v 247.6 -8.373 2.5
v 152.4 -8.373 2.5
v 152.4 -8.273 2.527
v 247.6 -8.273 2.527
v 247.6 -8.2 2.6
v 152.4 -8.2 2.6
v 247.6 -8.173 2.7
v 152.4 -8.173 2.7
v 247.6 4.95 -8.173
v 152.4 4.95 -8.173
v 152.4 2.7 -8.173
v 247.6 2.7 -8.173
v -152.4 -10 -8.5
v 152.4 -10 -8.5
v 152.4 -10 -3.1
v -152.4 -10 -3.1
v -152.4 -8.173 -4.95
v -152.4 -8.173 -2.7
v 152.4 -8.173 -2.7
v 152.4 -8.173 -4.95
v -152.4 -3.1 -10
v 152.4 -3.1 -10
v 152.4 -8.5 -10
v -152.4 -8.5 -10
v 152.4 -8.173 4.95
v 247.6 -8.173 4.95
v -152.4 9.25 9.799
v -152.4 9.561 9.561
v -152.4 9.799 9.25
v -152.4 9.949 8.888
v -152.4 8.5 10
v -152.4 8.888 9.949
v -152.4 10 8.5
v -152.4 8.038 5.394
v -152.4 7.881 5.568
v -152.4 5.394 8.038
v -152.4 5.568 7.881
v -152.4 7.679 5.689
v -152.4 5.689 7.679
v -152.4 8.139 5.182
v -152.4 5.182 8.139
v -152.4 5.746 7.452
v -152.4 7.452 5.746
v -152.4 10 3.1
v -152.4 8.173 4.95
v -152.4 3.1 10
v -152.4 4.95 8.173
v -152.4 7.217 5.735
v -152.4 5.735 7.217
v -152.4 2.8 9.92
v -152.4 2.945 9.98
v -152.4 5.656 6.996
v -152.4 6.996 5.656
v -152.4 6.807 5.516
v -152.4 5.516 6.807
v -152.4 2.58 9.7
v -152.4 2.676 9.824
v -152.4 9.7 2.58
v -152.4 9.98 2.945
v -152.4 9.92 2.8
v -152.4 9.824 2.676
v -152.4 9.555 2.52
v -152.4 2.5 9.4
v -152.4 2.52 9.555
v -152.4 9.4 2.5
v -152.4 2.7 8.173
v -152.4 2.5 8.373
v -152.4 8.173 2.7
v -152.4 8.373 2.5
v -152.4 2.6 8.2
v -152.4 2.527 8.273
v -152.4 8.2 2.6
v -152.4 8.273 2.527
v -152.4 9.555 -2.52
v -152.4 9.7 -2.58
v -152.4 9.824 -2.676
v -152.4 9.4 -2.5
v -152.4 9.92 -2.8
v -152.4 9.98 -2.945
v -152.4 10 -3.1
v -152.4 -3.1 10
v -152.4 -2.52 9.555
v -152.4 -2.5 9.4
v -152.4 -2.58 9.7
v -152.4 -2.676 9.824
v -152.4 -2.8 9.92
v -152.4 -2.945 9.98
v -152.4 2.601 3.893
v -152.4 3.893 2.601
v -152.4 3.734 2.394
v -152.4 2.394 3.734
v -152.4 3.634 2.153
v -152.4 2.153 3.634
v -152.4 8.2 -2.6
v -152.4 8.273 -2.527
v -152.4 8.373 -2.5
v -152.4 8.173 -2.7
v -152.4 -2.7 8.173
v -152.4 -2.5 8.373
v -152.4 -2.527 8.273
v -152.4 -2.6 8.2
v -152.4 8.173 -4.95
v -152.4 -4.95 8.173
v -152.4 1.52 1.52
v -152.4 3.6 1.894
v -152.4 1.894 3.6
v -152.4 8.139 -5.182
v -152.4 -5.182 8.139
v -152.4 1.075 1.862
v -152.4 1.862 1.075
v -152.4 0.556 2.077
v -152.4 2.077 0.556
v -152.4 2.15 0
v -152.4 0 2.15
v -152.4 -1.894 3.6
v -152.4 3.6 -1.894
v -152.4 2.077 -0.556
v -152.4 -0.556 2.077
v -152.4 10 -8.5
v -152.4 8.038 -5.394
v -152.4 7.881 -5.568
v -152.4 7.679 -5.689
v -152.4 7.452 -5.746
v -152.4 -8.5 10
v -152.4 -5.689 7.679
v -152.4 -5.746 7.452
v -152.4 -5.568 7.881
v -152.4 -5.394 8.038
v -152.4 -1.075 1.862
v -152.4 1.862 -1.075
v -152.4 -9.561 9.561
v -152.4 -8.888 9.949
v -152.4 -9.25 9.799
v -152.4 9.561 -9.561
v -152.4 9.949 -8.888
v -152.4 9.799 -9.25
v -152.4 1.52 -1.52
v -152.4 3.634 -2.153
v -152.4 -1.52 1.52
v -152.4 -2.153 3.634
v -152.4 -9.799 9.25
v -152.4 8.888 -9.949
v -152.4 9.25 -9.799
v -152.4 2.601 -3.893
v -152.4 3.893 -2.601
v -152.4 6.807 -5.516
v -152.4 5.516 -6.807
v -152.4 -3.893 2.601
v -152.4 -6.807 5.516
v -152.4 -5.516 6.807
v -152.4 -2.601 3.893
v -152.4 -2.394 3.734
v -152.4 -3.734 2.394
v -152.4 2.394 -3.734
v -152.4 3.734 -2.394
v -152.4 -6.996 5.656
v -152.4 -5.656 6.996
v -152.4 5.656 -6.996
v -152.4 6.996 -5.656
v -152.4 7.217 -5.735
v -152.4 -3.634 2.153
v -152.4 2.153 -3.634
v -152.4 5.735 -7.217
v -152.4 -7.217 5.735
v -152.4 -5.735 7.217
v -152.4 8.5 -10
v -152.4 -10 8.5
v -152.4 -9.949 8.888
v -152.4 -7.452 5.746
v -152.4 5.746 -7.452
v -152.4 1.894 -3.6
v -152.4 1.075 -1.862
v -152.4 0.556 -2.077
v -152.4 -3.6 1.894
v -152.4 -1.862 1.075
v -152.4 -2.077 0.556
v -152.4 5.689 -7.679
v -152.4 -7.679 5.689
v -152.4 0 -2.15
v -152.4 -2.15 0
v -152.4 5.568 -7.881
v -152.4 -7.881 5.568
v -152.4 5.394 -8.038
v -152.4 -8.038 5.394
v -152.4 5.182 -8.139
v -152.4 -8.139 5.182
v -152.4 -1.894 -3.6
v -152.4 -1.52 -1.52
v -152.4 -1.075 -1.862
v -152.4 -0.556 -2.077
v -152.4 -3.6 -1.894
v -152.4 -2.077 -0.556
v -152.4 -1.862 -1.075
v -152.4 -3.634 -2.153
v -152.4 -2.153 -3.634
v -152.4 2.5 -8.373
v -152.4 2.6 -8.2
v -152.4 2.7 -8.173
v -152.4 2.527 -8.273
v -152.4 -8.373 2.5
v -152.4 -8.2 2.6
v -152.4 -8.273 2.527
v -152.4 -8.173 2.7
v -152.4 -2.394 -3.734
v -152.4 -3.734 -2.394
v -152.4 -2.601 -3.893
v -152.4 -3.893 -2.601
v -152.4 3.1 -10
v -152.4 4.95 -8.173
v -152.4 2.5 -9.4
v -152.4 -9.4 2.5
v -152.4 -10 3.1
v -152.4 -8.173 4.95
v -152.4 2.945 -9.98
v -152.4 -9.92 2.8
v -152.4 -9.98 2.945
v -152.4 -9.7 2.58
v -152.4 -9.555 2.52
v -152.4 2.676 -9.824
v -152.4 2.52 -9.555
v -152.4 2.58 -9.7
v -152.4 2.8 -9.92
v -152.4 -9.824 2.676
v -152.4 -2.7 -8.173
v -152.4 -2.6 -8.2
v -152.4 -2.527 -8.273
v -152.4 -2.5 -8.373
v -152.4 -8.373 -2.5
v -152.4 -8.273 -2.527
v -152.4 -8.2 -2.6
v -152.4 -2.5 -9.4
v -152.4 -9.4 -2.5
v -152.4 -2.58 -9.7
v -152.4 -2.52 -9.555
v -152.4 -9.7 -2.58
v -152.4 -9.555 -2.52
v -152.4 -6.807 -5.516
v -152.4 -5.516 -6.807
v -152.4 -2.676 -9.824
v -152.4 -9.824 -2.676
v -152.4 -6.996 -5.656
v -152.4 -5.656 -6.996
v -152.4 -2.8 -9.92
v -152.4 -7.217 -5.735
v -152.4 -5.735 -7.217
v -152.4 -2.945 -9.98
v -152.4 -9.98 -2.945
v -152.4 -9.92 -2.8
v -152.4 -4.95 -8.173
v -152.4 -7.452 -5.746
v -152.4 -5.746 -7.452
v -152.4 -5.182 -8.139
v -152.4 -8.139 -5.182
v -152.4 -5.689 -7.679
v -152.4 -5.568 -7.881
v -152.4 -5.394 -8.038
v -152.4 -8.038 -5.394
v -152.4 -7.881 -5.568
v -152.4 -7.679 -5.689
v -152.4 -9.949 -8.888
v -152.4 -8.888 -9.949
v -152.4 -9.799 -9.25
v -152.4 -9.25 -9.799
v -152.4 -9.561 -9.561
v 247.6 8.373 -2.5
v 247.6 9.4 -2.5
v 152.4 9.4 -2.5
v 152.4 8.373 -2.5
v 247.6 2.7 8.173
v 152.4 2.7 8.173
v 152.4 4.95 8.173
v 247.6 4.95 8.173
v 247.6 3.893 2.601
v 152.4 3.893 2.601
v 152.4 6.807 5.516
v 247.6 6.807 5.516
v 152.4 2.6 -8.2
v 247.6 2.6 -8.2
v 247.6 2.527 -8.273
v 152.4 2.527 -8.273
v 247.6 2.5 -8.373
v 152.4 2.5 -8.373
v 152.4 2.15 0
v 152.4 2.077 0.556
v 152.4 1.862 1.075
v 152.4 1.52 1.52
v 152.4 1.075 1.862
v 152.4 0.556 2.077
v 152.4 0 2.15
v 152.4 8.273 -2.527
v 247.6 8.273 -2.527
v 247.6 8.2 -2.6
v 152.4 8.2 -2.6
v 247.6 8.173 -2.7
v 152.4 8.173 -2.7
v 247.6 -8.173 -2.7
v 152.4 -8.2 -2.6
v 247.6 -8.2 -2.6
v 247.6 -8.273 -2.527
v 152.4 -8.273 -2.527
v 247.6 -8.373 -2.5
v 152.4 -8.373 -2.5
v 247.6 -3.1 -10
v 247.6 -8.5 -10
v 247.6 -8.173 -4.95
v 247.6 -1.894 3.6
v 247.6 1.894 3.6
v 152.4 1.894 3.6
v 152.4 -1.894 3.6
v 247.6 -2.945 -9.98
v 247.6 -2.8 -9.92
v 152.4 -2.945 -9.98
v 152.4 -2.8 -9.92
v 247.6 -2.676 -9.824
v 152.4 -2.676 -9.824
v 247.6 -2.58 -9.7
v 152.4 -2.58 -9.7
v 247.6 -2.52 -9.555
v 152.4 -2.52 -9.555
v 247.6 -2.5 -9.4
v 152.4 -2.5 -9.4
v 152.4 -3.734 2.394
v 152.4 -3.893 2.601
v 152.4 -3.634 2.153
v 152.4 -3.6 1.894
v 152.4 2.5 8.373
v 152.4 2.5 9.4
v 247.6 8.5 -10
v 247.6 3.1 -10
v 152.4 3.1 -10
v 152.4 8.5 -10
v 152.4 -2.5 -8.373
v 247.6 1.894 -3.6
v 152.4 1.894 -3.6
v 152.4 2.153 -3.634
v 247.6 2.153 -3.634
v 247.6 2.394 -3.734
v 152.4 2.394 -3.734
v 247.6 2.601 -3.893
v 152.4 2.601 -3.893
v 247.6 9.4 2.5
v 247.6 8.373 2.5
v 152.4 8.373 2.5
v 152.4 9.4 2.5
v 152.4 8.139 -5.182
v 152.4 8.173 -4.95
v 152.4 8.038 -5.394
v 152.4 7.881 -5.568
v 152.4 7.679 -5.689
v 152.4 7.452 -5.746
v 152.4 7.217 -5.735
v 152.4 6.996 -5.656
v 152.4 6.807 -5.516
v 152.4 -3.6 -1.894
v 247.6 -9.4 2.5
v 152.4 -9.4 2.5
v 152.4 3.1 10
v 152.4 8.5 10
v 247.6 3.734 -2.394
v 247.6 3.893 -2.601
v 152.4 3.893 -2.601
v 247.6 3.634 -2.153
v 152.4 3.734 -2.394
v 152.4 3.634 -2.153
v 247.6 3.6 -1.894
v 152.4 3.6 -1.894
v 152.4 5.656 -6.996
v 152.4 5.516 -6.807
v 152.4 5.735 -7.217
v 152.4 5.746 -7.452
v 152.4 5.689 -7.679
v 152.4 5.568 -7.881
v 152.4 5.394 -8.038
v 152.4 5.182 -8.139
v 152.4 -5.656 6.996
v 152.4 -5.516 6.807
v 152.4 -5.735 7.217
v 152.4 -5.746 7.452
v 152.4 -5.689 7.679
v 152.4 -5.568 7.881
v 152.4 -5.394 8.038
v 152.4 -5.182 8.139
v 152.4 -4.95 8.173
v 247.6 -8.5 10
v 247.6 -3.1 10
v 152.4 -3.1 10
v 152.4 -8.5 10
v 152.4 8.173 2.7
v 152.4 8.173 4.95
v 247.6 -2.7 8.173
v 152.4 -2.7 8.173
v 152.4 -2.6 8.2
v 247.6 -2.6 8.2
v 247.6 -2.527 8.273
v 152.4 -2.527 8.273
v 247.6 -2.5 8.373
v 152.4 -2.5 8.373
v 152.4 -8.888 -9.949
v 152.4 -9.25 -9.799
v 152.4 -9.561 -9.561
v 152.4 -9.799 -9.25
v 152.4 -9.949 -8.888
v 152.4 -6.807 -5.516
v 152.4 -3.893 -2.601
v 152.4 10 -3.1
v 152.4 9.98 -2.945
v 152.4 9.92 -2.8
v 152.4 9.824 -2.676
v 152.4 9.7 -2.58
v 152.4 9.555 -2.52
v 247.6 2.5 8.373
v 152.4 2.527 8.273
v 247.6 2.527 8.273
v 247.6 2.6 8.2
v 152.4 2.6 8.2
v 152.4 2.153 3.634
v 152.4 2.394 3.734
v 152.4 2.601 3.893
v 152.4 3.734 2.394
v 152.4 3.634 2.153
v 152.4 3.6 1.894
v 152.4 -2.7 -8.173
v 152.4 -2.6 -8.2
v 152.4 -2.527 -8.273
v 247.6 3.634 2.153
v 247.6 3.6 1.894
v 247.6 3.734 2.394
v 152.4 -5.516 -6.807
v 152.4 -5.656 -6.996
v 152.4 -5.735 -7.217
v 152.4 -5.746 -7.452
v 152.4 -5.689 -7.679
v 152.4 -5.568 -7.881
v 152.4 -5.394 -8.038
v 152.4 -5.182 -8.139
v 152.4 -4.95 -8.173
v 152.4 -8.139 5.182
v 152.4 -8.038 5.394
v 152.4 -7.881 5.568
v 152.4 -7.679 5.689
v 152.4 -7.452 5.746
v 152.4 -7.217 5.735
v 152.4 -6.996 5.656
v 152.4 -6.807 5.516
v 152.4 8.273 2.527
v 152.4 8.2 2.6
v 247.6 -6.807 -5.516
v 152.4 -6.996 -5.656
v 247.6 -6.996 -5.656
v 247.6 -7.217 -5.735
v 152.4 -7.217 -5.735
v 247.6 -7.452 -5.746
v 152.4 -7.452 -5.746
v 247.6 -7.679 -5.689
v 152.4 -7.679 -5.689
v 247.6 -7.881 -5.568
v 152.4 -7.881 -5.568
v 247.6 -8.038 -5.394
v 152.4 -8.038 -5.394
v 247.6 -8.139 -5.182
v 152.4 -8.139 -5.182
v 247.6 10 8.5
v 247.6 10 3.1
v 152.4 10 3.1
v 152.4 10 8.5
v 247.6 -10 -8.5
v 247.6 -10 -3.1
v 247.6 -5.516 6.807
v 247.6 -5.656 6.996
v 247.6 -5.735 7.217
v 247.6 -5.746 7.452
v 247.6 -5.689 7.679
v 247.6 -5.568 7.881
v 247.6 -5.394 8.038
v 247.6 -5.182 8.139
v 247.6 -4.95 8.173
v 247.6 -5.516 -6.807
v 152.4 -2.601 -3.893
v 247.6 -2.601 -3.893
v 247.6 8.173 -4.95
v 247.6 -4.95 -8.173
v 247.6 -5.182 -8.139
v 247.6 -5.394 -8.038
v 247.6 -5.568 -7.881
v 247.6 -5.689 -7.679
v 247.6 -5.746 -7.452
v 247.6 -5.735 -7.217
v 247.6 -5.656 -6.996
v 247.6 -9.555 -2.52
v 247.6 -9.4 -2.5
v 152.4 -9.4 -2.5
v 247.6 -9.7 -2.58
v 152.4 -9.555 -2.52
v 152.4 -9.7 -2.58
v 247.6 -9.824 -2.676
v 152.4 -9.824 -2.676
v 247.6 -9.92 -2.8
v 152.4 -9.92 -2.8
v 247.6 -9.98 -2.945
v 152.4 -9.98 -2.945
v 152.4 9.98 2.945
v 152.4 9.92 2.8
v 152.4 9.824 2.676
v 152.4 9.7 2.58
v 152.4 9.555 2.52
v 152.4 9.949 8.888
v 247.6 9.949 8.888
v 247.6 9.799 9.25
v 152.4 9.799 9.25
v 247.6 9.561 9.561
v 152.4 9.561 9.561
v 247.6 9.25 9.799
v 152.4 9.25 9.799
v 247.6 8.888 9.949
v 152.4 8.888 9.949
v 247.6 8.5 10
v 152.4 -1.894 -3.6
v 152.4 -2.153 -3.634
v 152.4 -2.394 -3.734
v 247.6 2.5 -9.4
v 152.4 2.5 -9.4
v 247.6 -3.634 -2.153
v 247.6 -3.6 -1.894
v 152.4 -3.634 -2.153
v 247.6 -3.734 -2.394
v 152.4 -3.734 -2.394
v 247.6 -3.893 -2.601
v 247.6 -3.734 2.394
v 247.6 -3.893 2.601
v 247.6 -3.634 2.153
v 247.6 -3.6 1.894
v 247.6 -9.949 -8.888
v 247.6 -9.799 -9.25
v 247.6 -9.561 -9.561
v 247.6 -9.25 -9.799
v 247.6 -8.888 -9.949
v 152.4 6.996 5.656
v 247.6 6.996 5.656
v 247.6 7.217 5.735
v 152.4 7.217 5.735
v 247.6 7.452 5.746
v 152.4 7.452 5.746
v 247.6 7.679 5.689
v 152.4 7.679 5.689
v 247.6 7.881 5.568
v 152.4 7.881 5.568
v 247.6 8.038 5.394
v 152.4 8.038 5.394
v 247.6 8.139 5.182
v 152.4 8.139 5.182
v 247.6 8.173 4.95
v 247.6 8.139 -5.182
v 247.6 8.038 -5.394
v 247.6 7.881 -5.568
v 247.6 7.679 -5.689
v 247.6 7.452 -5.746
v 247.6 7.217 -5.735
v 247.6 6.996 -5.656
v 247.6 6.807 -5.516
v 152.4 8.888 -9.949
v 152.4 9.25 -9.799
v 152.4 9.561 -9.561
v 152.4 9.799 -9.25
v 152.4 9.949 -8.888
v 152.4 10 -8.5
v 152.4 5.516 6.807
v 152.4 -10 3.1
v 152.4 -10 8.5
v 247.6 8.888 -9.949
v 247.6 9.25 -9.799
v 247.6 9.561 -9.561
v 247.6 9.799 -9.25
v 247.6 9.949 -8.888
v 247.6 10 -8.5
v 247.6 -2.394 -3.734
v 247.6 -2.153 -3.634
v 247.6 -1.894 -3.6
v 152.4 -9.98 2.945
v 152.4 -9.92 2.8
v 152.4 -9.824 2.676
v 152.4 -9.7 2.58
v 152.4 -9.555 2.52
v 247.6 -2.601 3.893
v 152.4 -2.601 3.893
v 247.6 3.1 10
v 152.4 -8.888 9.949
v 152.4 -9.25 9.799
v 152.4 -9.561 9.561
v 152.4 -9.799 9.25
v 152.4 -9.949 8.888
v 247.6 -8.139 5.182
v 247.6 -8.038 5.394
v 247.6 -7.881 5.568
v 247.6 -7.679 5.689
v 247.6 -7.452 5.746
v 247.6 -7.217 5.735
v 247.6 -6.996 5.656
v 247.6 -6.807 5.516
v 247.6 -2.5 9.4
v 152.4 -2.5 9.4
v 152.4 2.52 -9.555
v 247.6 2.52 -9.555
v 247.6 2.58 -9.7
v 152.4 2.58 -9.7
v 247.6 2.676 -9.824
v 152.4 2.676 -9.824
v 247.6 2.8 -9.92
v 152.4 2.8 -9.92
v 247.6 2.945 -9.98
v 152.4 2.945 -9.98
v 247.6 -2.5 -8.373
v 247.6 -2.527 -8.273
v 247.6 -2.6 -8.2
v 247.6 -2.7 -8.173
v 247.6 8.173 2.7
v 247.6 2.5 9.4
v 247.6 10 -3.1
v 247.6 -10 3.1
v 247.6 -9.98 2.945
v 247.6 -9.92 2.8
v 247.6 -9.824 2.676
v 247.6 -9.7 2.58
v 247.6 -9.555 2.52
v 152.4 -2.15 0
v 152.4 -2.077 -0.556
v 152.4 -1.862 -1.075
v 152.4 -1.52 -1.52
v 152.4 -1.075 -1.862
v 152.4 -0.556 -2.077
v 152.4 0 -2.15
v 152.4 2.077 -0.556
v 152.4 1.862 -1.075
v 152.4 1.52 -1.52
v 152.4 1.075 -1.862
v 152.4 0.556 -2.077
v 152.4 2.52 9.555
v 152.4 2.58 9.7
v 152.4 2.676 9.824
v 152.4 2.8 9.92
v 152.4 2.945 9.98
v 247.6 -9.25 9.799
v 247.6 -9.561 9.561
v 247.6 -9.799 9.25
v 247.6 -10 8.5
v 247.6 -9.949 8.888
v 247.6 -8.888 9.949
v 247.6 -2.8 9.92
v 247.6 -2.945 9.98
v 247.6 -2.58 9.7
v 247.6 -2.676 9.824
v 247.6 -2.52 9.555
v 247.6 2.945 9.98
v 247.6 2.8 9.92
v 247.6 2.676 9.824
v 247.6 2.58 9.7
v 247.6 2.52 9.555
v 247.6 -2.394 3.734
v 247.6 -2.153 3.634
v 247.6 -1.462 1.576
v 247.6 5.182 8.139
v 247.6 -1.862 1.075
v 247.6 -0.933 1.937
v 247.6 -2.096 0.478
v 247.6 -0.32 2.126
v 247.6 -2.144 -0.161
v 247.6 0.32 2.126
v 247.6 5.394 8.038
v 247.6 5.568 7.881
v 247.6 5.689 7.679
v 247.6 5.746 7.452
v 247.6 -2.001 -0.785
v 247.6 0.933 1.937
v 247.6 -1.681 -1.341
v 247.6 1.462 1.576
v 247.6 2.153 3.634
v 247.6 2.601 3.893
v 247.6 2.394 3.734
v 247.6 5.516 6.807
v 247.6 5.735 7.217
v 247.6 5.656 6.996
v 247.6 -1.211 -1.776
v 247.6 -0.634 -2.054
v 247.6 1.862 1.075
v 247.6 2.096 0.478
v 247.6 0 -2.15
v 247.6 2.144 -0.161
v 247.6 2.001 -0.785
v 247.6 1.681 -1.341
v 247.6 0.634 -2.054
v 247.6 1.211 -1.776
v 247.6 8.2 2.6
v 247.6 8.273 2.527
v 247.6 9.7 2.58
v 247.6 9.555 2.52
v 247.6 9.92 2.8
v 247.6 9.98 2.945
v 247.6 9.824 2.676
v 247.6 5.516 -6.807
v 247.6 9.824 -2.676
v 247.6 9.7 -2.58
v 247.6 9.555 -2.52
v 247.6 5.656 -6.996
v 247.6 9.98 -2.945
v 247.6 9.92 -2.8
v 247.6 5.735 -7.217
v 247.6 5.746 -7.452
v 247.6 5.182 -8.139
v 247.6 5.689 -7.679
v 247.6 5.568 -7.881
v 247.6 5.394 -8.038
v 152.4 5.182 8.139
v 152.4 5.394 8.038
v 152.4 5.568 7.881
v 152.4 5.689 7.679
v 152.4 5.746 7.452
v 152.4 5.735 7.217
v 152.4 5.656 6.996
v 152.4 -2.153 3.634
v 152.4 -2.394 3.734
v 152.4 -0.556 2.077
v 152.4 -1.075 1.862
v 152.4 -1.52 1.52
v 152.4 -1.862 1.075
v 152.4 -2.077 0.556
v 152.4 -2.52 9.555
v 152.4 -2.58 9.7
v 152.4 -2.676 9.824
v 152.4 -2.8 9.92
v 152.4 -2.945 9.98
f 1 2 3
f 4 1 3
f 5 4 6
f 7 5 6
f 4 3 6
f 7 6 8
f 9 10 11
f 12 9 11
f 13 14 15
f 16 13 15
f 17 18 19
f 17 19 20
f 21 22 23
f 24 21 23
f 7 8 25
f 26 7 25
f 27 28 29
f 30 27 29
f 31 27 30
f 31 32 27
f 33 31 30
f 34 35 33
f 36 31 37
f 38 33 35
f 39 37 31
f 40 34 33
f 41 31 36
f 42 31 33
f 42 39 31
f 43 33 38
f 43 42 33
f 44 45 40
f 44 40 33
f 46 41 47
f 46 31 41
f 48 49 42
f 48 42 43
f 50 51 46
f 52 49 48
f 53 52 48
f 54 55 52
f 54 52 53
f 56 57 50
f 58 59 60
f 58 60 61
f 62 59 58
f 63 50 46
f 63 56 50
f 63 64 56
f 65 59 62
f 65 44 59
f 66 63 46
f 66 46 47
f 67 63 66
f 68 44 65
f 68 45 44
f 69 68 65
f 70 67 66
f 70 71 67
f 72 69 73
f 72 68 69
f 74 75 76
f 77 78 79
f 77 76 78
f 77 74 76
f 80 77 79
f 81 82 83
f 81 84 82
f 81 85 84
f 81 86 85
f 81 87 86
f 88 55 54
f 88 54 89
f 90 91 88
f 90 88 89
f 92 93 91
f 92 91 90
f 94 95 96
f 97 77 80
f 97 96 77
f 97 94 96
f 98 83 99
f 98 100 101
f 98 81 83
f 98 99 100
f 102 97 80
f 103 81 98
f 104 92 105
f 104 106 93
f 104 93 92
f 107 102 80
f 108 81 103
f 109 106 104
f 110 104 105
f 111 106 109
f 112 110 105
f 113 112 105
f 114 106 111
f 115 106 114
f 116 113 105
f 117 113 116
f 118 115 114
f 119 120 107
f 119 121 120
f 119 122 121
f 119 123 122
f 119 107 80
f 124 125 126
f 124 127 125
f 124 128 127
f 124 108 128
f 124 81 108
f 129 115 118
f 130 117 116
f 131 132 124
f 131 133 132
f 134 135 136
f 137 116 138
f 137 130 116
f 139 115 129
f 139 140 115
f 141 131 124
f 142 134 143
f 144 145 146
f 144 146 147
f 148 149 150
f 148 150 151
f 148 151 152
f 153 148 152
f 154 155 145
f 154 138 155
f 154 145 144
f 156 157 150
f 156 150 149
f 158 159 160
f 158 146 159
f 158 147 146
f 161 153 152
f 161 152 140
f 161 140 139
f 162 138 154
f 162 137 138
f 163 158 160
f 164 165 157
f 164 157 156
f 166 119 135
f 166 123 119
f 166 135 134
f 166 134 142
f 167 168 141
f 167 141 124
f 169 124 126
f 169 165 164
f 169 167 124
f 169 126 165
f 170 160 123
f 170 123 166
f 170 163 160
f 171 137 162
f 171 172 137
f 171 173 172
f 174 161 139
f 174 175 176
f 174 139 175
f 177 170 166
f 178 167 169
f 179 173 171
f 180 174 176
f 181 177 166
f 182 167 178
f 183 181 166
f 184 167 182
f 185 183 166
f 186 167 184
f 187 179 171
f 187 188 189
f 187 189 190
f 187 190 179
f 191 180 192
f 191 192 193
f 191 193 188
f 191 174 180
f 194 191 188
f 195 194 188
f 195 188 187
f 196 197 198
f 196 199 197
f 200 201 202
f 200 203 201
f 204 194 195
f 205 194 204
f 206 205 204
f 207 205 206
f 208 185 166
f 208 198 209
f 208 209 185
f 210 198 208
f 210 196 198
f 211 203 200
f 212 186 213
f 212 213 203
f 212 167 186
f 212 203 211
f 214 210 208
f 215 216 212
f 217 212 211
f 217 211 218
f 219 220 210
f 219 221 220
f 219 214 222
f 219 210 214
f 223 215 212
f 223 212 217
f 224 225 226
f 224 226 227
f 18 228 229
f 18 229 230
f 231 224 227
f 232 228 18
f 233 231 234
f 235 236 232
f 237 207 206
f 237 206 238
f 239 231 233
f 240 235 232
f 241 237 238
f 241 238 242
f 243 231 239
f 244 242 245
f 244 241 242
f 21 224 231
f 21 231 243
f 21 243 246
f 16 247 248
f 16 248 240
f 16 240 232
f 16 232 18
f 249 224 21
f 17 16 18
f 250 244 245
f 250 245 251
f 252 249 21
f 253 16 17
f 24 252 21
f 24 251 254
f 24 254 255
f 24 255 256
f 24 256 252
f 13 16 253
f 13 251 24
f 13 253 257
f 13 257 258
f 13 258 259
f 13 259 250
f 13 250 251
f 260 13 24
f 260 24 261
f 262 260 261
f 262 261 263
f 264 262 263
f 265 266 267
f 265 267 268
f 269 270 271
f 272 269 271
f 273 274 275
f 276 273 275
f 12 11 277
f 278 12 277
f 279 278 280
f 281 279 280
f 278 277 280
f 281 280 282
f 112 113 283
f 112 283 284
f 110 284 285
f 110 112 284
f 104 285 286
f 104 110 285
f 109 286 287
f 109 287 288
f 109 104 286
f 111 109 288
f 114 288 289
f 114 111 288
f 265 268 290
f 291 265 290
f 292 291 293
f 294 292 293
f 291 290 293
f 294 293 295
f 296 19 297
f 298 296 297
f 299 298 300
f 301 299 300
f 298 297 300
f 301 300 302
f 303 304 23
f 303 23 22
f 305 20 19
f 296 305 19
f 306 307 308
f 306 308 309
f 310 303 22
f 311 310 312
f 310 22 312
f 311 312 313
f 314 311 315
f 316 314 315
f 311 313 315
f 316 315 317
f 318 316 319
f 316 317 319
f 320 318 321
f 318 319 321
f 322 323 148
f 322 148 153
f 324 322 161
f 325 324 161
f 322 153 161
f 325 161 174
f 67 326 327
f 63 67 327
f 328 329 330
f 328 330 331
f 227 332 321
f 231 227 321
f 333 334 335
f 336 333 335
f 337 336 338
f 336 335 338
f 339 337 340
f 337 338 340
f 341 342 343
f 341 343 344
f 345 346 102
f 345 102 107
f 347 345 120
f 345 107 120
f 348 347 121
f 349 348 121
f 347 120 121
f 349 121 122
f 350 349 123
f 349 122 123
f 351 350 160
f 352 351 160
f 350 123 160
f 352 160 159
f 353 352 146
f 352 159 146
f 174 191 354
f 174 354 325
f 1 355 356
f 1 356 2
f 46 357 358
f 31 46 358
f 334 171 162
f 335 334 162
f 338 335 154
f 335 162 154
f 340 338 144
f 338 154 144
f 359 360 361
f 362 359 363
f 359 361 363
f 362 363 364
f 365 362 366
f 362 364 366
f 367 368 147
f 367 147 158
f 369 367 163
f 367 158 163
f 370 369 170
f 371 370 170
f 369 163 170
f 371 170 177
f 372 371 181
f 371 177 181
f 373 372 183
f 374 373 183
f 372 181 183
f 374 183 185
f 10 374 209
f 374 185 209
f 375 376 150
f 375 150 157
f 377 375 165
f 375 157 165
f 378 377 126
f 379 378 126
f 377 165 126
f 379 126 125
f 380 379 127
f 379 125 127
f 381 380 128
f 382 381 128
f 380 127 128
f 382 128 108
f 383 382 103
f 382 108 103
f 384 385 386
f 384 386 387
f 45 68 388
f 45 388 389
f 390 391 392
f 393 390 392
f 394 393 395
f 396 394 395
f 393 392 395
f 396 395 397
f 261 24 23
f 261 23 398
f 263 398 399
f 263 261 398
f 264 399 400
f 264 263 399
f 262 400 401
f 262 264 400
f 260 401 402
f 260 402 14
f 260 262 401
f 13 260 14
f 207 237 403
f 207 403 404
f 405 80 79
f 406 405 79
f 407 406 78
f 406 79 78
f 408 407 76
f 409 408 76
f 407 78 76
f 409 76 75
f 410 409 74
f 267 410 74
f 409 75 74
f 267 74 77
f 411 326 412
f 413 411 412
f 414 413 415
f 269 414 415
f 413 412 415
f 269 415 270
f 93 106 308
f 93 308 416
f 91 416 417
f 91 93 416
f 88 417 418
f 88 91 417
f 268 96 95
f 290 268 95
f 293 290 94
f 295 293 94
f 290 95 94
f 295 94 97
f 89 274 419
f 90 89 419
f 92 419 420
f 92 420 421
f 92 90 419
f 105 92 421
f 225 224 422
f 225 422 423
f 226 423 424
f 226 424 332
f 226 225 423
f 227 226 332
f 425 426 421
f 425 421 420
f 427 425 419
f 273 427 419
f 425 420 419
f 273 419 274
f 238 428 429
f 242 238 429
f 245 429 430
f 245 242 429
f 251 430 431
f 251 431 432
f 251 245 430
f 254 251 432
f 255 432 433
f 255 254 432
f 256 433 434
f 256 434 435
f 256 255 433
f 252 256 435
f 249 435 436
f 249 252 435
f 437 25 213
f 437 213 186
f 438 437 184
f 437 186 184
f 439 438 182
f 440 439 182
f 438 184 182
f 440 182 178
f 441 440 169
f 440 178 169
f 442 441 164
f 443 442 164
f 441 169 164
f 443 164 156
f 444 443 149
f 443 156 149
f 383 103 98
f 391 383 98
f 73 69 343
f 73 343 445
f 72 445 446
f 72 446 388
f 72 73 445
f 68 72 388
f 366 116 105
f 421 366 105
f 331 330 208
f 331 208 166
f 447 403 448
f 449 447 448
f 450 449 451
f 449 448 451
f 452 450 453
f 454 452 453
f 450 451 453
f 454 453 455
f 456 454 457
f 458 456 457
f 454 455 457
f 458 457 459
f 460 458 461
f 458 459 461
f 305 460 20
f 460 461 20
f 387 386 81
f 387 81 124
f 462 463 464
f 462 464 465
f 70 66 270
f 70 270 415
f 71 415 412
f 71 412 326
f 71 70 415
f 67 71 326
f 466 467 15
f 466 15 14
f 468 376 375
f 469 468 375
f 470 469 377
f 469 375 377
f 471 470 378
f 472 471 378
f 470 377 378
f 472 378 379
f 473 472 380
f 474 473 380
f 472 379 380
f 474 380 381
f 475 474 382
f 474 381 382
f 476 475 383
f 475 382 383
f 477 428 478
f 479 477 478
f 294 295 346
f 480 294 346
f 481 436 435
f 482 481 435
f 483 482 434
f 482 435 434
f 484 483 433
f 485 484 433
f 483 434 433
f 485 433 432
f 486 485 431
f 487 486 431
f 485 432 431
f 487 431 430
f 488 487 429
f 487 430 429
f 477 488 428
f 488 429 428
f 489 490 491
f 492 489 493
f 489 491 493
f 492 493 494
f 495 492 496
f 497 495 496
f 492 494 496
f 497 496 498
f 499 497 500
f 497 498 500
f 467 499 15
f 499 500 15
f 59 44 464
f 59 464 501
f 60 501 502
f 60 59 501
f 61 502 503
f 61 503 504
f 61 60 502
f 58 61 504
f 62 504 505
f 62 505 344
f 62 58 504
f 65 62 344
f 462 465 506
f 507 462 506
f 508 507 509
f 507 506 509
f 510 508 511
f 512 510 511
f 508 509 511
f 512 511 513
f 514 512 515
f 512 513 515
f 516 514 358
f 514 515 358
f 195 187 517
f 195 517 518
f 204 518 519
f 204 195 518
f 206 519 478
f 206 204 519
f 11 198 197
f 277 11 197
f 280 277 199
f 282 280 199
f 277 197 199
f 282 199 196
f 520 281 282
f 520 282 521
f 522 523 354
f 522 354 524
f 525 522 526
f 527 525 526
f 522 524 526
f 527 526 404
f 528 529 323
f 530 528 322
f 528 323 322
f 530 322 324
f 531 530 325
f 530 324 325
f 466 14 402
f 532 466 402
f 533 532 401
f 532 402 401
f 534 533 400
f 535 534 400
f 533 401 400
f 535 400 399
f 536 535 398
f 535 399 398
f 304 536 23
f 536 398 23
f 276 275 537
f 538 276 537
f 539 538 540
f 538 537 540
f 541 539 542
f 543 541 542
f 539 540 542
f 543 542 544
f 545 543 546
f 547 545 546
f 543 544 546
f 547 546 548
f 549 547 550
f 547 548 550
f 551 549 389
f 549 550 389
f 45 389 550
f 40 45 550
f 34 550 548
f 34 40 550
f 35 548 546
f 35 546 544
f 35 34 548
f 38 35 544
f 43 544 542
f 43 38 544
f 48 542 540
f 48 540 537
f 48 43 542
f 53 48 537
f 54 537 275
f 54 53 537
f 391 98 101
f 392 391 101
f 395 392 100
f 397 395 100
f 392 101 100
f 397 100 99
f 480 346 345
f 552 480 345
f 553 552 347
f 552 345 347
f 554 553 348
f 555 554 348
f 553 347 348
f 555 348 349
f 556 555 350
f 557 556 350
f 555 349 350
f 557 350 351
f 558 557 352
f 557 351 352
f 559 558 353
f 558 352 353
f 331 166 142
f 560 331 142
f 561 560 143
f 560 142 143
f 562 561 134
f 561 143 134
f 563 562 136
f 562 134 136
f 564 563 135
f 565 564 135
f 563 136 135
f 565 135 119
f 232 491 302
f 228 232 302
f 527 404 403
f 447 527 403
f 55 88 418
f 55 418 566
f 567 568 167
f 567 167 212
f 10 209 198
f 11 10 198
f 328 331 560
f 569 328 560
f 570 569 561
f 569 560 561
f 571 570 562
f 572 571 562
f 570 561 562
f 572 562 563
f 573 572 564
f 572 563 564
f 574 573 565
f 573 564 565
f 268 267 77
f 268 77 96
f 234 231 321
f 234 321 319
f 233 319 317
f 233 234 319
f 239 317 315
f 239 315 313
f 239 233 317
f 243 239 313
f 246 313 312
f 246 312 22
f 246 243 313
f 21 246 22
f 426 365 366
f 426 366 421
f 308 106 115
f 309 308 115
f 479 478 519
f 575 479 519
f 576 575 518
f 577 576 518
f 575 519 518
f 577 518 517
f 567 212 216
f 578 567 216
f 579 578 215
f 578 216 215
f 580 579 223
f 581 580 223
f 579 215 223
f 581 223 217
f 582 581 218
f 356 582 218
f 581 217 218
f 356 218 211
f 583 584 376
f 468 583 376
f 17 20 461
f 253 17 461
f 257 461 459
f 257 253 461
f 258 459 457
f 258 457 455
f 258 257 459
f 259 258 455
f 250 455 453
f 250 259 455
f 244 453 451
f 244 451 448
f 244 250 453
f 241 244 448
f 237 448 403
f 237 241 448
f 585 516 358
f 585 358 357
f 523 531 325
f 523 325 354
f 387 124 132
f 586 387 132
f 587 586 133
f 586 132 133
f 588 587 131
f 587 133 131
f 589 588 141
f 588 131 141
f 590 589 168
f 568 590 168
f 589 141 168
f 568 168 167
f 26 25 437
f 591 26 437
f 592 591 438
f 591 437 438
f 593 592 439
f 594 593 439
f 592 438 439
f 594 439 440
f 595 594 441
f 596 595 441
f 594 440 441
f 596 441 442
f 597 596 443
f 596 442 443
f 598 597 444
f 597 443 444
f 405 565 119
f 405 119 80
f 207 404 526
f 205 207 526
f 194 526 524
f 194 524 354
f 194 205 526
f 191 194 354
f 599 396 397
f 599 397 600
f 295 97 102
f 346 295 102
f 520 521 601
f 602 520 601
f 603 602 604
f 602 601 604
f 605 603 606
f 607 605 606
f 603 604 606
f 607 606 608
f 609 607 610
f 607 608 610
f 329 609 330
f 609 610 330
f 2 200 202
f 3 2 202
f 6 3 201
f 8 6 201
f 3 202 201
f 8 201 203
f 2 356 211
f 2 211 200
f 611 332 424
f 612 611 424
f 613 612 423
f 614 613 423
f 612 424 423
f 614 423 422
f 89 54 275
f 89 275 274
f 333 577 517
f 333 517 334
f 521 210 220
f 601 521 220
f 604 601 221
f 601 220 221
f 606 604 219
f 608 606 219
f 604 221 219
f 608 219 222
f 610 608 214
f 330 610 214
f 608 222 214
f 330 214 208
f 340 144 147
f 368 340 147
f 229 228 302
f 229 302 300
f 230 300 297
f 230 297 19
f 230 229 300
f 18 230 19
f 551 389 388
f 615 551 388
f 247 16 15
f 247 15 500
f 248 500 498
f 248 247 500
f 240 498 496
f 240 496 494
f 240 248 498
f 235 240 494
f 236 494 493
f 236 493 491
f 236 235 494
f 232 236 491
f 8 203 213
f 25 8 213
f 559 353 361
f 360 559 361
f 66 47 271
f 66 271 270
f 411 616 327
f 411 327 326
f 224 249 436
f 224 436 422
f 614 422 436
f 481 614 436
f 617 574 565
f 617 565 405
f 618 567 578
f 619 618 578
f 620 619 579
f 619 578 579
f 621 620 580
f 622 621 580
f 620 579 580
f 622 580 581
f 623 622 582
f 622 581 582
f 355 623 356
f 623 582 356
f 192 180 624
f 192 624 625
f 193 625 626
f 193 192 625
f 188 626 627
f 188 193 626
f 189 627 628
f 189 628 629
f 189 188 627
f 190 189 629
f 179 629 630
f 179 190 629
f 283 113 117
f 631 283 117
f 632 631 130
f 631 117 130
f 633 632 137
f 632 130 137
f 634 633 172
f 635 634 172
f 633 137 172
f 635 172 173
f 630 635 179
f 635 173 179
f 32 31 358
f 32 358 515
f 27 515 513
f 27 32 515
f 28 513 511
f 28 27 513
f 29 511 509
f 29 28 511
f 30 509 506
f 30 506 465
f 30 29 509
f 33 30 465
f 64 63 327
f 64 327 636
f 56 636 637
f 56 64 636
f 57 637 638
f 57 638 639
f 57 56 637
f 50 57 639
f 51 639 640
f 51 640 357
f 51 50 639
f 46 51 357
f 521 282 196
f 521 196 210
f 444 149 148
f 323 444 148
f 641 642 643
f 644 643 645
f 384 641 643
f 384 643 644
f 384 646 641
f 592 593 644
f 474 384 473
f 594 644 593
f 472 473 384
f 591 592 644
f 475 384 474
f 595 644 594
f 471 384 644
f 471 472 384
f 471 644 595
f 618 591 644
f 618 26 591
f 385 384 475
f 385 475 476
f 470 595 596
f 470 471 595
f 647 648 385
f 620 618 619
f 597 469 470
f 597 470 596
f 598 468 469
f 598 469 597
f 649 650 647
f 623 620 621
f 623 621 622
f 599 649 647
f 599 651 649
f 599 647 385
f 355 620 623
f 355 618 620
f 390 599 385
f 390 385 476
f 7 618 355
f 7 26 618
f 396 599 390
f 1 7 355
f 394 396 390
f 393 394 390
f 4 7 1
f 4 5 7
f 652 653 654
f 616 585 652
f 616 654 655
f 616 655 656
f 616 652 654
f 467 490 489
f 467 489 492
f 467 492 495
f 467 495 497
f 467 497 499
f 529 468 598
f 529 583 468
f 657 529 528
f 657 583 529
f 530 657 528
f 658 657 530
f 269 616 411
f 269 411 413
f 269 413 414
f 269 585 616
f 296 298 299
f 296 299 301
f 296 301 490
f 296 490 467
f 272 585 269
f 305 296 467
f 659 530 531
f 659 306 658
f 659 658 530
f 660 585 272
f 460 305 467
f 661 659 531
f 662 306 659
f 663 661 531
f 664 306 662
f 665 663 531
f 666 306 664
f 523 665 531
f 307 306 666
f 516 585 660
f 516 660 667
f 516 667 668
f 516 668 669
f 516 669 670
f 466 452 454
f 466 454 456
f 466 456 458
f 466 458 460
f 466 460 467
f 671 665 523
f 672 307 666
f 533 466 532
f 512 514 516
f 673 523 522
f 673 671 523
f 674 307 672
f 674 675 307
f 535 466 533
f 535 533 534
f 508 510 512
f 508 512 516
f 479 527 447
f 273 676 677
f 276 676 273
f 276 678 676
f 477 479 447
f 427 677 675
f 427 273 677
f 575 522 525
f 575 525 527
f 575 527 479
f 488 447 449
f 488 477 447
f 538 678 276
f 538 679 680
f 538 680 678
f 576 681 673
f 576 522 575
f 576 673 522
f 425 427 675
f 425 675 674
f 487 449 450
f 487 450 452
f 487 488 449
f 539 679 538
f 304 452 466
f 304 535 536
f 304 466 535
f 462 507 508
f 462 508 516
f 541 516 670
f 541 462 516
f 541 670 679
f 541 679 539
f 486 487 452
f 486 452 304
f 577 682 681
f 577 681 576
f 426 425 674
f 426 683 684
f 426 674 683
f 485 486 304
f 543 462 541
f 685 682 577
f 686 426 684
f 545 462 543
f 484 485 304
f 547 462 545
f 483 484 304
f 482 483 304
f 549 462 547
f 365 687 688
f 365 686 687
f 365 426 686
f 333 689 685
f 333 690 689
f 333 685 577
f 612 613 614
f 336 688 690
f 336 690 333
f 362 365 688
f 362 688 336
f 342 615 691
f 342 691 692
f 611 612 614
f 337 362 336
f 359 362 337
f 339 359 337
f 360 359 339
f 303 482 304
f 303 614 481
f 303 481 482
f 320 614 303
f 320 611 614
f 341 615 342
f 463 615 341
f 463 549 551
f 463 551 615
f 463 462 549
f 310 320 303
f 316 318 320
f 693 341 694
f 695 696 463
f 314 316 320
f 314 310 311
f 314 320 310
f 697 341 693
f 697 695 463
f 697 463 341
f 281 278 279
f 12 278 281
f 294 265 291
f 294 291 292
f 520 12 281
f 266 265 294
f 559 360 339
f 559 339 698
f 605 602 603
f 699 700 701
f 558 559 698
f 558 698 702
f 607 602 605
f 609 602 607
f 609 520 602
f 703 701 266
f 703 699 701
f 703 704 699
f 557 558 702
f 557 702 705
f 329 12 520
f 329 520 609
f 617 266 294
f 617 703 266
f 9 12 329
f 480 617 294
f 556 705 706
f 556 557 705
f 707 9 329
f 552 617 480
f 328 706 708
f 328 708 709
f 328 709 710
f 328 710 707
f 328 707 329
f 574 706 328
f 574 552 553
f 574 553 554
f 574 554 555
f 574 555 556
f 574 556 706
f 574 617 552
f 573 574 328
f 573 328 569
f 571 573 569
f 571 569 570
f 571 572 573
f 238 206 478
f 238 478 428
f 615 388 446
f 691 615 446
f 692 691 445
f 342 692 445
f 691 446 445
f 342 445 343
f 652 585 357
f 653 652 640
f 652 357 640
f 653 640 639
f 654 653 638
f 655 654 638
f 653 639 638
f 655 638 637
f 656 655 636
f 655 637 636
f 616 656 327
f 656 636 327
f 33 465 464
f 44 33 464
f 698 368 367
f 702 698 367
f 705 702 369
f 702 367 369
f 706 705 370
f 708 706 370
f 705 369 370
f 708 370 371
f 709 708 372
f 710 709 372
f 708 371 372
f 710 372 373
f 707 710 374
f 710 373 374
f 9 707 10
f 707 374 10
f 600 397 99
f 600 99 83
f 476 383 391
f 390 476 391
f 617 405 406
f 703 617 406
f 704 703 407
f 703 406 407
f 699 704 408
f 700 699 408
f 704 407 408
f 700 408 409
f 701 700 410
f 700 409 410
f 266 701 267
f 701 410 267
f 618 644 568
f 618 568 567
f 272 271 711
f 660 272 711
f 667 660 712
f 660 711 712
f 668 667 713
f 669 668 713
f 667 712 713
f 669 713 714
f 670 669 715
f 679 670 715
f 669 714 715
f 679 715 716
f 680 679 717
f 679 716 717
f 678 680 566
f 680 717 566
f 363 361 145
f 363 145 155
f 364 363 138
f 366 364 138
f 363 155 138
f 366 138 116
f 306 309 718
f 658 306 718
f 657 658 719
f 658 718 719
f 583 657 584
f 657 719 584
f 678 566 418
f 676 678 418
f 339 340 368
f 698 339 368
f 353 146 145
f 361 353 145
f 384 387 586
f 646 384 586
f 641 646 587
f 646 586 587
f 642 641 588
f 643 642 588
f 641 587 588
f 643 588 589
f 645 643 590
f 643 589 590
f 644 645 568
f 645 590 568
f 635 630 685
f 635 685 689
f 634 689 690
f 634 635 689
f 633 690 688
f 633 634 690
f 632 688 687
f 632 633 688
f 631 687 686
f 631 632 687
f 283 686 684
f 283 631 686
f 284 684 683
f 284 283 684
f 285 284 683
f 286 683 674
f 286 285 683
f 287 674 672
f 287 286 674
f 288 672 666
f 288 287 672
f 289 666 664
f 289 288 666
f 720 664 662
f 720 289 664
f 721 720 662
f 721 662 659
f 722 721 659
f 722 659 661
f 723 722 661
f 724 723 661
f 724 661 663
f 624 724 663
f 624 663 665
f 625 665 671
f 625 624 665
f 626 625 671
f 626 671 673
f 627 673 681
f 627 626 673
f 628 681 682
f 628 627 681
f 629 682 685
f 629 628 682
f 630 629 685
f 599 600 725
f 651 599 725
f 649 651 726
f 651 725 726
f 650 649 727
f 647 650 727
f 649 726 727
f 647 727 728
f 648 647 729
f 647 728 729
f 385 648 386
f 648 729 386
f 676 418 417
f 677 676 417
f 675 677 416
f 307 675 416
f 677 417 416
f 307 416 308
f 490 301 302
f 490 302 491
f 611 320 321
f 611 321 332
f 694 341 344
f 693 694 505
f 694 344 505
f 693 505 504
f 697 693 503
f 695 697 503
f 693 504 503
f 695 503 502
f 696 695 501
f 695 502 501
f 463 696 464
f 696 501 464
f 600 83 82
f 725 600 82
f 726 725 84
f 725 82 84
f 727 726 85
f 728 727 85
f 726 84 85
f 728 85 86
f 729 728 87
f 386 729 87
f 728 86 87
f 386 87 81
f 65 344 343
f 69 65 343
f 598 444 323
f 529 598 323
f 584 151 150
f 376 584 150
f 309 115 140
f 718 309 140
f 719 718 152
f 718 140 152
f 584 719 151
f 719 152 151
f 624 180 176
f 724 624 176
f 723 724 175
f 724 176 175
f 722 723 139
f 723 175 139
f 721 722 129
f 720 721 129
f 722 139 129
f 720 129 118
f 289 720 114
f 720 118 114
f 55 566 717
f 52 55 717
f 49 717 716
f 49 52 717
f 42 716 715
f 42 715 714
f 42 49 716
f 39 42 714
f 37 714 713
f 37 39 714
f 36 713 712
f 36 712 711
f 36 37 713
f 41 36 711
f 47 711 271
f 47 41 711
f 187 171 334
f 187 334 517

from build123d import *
from build123d.topology import SkipClean

# Parameters (mm, degrees)
BOSS_EXTRUDE1_DEPTH      = 152.4
BOSS_EXTRUDE1_DEPTH_BACK = 152.4
SKETCH4_R                = 2.15
BOSS_EXTRUDE2_DEPTH      = 95.2


with BuildPart() as part:
    # Sketch3 → Boss-Extrude1 (new, two sides: drawn at the far end of the back side and taken through both)
    with BuildSketch(Plane(origin=(0, 0, 0), x_dir=(0, 0, -1), z_dir=(1, 0, 0)).offset(-BOSS_EXTRUDE1_DEPTH_BACK)):
        with BuildLine():
            Line((-5.515685425, 6.807463915), (-2.601114729, 3.892893219))
            ThreePointArc((-2.601114729, 3.892893219), (-2.27669138, 3.676120467), (-1.894007948, 3.6))
            Line((-1.894007948, 3.6), (0, 3.6))
            Line((0, 3.6), (0, 2.15))
            ThreePointArc((0, 2.15), (-1.52027958, 1.52027958), (-2.15, 0))
            Line((-2.15, 0), (-3.6, 0))
            Line((-3.6, 0), (-3.6, 1.894007948))
            ThreePointArc((-3.6, 1.894007948), (-3.676120467, 2.27669138), (-3.892893219, 2.601114729))
            Line((-3.892893219, 2.601114729), (-6.807463915, 5.515685425))
            ThreePointArc((-6.807463915, 5.515685425), (-7.679296086, 5.689103626), (-8.17314934, 4.95))
            Line((-8.17314934, 4.95), (-8.17314934, 2.7))
            ThreePointArc((-8.17314934, 2.7), (-8.231727984, 2.558578644), (-8.37314934, 2.5))
            Line((-8.37314934, 2.5), (-9.4, 2.5))
            ThreePointArc((-9.4, 2.5), (-9.824264069, 2.675735931), (-10, 3.1))
            Line((-10, 3.1), (-10, 8.5))
            ThreePointArc((-10, 8.5), (-9.560660172, 9.560660172), (-8.5, 10))
            Line((-8.5, 10), (-3.1, 10))
            ThreePointArc((-3.1, 10), (-2.675735931, 9.824264069), (-2.5, 9.4))
            Line((-2.5, 9.4), (-2.5, 8.37314934))
            ThreePointArc((-2.5, 8.37314934), (-2.558578644, 8.231727984), (-2.7, 8.17314934))
            Line((-2.7, 8.17314934), (-4.95, 8.17314934))
            ThreePointArc((-4.95, 8.17314934), (-5.689103626, 7.679296086), (-5.515685425, 6.807463915))
        make_face()
    extrude(amount=BOSS_EXTRUDE1_DEPTH + BOSS_EXTRUDE1_DEPTH_BACK)

    # Mirror1: part across plane


with BuildPart() as part_1:
    add(part.part)
    add(part.part.mirror(Plane.ZX))

    # Mirror2: part across plane


with BuildPart() as part_2:
    add(part_1.part)
    add(part_1.part.mirror(Plane.XY))

    # Sketch4 → Boss-Extrude2 (add)
    with SkipClean():  # the faces are left unmerged after this step: merging them gives an invalid solid
        with BuildSketch(Plane(origin=(152.4, 0, 0), x_dir=(0, 0, -1), z_dir=(1, 0, 0))):
            with BuildLine():
                Line((1.894007948, 3.6), (-1.894007948, 3.6))
                ThreePointArc((-1.894007948, 3.6), (-2.27669138, 3.676120467), (-2.601114729, 3.892893219))
                Line((-2.601114729, 3.892893219), (-5.515685425, 6.807463915))
                ThreePointArc((-5.515685425, 6.807463915), (-5.689103626, 7.679296086), (-4.95, 8.17314934))
                Line((-4.95, 8.17314934), (-2.7, 8.17314934))
                ThreePointArc((-2.7, 8.17314934), (-2.558578644, 8.231727984), (-2.5, 8.37314934))
                Line((-2.5, 8.37314934), (-2.5, 9.4))
                ThreePointArc((-2.5, 9.4), (-2.675735931, 9.824264069), (-3.1, 10))
                Line((-3.1, 10), (-8.5, 10))
                ThreePointArc((-8.5, 10), (-9.560660172, 9.560660172), (-10, 8.5))
                Line((-10, 8.5), (-10, 3.1))
                ThreePointArc((-10, 3.1), (-9.824264069, 2.675735931), (-9.4, 2.5))
                Line((-9.4, 2.5), (-8.37314934, 2.5))
                ThreePointArc((-8.37314934, 2.5), (-8.231727984, 2.558578644), (-8.17314934, 2.7))
                Line((-8.17314934, 2.7), (-8.17314934, 4.95))
                ThreePointArc((-8.17314934, 4.95), (-7.679296086, 5.689103626), (-6.807463915, 5.515685425))
                Line((-6.807463915, 5.515685425), (-3.892893219, 2.601114729))
                ThreePointArc((-3.892893219, 2.601114729), (-3.676120467, 2.27669138), (-3.6, 1.894007948))
                Line((-3.6, 1.894007948), (-3.6, -1.894007948))
                ThreePointArc((-3.6, -1.894007948), (-3.676120467, -2.27669138), (-3.892893219, -2.601114729))
                Line((-3.892893219, -2.601114729), (-6.807463915, -5.515685425))
                ThreePointArc((-6.807463915, -5.515685425), (-7.679296086, -5.689103626), (-8.17314934, -4.95))
                Line((-8.17314934, -4.95), (-8.17314934, -2.7))
                ThreePointArc((-8.17314934, -2.7), (-8.231727984, -2.558578644), (-8.37314934, -2.5))
                Line((-8.37314934, -2.5), (-9.4, -2.5))
                ThreePointArc((-9.4, -2.5), (-9.824264069, -2.675735931), (-10, -3.1))
                Line((-10, -3.1), (-10, -8.5))
                ThreePointArc((-10, -8.5), (-9.560660172, -9.560660172), (-8.5, -10))
                Line((-8.5, -10), (-3.1, -10))
                ThreePointArc((-3.1, -10), (-2.675735931, -9.824264069), (-2.5, -9.4))
                Line((-2.5, -9.4), (-2.5, -8.37314934))
                ThreePointArc((-2.5, -8.37314934), (-2.558578644, -8.231727984), (-2.7, -8.17314934))
                Line((-2.7, -8.17314934), (-4.95, -8.17314934))
                ThreePointArc((-4.95, -8.17314934), (-5.689103626, -7.679296086), (-5.515685425, -6.807463915))
                Line((-5.515685425, -6.807463915), (-2.601114729, -3.892893219))
                ThreePointArc((-2.601114729, -3.892893219), (-2.27669138, -3.676120467), (-1.894007948, -3.6))
                Line((-1.894007948, -3.6), (1.894007948, -3.6))
                ThreePointArc((1.894007948, -3.6), (2.27669138, -3.676120467), (2.601114729, -3.892893219))
                Line((2.601114729, -3.892893219), (5.515685425, -6.807463915))
                ThreePointArc((5.515685425, -6.807463915), (5.689103626, -7.679296086), (4.95, -8.17314934))
                Line((4.95, -8.17314934), (2.7, -8.17314934))
                ThreePointArc((2.7, -8.17314934), (2.558578644, -8.231727984), (2.5, -8.37314934))
                Line((2.5, -8.37314934), (2.5, -9.4))
                ThreePointArc((2.5, -9.4), (2.675735931, -9.824264069), (3.1, -10))
                Line((3.1, -10), (8.5, -10))
                ThreePointArc((8.5, -10), (9.560660172, -9.560660172), (10, -8.5))
                Line((10, -8.5), (10, -3.1))
                ThreePointArc((10, -3.1), (9.824264069, -2.675735931), (9.4, -2.5))
                Line((9.4, -2.5), (8.37314934, -2.5))
                ThreePointArc((8.37314934, -2.5), (8.231727984, -2.558578644), (8.17314934, -2.7))
                Line((8.17314934, -2.7), (8.17314934, -4.95))
                ThreePointArc((8.17314934, -4.95), (7.679296086, -5.689103626), (6.807463915, -5.515685425))
                Line((6.807463915, -5.515685425), (3.892893219, -2.601114729))
                ThreePointArc((3.892893219, -2.601114729), (3.676120467, -2.27669138), (3.6, -1.894007948))
                Line((3.6, -1.894007948), (3.6, 1.894007948))
                ThreePointArc((3.6, 1.894007948), (3.676120467, 2.27669138), (3.892893219, 2.601114729))
                Line((3.892893219, 2.601114729), (6.807463915, 5.515685425))
                ThreePointArc((6.807463915, 5.515685425), (7.679296086, 5.689103626), (8.17314934, 4.95))
                Line((8.17314934, 4.95), (8.17314934, 2.7))
                ThreePointArc((8.17314934, 2.7), (8.231727984, 2.558578644), (8.37314934, 2.5))
                Line((8.37314934, 2.5), (9.4, 2.5))
                ThreePointArc((9.4, 2.5), (9.824264069, 2.675735931), (10, 3.1))
                Line((10, 3.1), (10, 8.5))
                ThreePointArc((10, 8.5), (9.560660172, 9.560660172), (8.5, 10))
                Line((8.5, 10), (3.1, 10))
                ThreePointArc((3.1, 10), (2.675735931, 9.824264069), (2.5, 9.4))
                Line((2.5, 9.4), (2.5, 8.37314934))
                ThreePointArc((2.5, 8.37314934), (2.558578644, 8.231727984), (2.7, 8.17314934))
                Line((2.7, 8.17314934), (4.95, 8.17314934))
                ThreePointArc((4.95, 8.17314934), (5.689103626, 7.679296086), (5.515685425, 6.807463915))
                Line((5.515685425, 6.807463915), (2.601114729, 3.892893219))
                ThreePointArc((2.601114729, 3.892893219), (2.27669138, 3.676120467), (1.894007948, 3.6))
            make_face()
            Circle(SKETCH4_R, mode=Mode.SUBTRACT)
        extrude(amount=BOSS_EXTRUDE2_DEPTH)


solid = part_2.part
